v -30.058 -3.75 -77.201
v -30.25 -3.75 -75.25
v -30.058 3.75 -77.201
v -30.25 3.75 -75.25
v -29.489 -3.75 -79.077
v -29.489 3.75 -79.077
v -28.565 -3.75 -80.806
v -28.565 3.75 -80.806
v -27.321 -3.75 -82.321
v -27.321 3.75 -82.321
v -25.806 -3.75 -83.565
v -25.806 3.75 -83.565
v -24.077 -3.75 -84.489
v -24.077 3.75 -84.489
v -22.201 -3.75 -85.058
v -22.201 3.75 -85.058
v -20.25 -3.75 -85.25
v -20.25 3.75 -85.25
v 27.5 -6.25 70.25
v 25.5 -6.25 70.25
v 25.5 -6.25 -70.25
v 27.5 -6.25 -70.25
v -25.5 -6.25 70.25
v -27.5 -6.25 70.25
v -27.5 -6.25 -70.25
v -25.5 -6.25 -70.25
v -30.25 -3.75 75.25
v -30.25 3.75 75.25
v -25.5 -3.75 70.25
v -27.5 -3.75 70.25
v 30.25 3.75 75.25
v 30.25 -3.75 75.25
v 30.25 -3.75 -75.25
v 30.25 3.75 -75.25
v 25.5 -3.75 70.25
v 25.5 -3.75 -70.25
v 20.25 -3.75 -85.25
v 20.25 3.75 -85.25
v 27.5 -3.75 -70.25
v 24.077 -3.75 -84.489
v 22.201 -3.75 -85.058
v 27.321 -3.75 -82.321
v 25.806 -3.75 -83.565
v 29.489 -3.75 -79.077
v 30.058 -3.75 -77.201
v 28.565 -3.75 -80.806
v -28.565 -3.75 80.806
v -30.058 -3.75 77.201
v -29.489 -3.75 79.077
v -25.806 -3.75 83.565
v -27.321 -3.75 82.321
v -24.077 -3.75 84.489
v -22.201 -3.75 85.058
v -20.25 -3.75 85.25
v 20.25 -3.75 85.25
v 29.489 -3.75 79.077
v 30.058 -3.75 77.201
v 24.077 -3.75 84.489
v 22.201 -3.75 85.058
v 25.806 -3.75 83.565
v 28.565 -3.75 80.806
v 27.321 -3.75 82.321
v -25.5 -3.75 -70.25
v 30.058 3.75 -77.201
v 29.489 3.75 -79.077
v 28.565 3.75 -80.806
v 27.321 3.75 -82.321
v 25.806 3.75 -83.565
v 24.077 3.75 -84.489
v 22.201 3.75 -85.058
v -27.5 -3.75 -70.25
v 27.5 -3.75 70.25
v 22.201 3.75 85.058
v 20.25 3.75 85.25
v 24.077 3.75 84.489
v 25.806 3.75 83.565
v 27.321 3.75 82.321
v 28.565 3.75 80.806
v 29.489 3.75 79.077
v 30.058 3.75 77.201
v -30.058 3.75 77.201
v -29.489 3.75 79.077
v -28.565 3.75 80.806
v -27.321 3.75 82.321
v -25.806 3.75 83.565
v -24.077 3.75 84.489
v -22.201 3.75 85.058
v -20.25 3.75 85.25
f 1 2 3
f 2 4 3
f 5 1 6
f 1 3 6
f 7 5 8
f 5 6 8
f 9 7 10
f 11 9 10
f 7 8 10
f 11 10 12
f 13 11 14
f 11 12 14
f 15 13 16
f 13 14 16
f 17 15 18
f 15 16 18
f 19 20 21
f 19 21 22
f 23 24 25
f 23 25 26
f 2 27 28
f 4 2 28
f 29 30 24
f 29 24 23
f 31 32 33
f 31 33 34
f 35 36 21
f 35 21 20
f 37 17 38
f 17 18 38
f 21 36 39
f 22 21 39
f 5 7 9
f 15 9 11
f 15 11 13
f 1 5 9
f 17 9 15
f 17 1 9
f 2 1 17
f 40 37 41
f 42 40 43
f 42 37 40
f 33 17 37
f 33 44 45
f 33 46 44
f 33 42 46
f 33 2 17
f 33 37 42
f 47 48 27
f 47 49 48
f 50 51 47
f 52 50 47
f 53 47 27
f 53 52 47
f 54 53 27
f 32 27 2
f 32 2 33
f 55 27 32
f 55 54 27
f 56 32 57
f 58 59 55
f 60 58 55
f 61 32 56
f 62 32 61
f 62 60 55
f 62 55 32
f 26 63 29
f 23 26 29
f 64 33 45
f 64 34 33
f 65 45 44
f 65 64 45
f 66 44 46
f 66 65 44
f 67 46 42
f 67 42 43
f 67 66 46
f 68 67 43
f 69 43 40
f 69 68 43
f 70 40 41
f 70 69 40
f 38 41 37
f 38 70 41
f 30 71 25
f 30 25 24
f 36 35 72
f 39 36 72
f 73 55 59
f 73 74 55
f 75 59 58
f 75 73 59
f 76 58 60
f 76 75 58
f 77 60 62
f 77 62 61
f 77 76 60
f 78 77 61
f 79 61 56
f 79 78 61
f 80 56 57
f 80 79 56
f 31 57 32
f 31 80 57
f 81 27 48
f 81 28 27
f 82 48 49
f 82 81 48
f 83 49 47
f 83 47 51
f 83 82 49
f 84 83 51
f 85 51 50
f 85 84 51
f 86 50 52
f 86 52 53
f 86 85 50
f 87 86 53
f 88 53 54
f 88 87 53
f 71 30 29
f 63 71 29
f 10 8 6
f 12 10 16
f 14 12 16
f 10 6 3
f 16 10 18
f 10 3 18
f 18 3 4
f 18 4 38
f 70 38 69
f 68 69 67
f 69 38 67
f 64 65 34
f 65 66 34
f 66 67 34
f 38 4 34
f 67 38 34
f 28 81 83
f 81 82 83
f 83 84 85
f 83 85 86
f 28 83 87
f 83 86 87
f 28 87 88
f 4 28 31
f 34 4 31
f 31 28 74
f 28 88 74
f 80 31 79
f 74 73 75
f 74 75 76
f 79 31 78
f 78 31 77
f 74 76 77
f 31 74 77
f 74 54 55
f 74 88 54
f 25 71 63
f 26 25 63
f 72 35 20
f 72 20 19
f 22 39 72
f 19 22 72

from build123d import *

# Parameters (mm, degrees)
SKETCH3_W             = 60.5
SKETCH3_H             = 7.5
BOSS_EXTRUDE1_DEPTH   = 85.25
SKETCH4_W             = 2
SKETCH4_H             = 140.5
BOSS_EXTRUDE2_DEPTH   = 2.5
BOSS_EXTRUDE2_2_DEPTH = 2.5
FILLET1_R             = 10


with BuildPart() as part:
    # Sketch3 → Boss-Extrude1 (new, symmetric)
    with BuildSketch(Plane.XY):
        Rectangle(SKETCH3_W, SKETCH3_H)
    extrude(amount=BOSS_EXTRUDE1_DEPTH, both=True)

    # Fillet1
    fillet1_edges = [part.edges().sort_by_distance(p)[0] for p in [
        (30.25, 0, 85.25),
        (-30.25, 0, 85.25),
        (30.25, 0, -85.25),
        (-30.25, 0, -85.25),
    ]]
    fillet(fillet1_edges, radius=FILLET1_R)


with BuildPart() as body_2:
    # Sketch4 → Boss-Extrude2 (new body)
    with BuildSketch(Plane.XZ.offset(3.75)):
        with Locations((-26.5, 0)):
            Rectangle(SKETCH4_W, SKETCH4_H)
    extrude(amount=BOSS_EXTRUDE2_DEPTH)


with BuildPart() as body_3:
    # Sketch4 → Boss-Extrude2 2 (new body)
    with BuildSketch(Plane.XZ.offset(3.75)):
        with Locations((26.5, 0)):
            Rectangle(SKETCH4_W, SKETCH4_H)
    extrude(amount=BOSS_EXTRUDE2_2_DEPTH)


solid = Compound([part.part, body_2.part, body_3.part])
